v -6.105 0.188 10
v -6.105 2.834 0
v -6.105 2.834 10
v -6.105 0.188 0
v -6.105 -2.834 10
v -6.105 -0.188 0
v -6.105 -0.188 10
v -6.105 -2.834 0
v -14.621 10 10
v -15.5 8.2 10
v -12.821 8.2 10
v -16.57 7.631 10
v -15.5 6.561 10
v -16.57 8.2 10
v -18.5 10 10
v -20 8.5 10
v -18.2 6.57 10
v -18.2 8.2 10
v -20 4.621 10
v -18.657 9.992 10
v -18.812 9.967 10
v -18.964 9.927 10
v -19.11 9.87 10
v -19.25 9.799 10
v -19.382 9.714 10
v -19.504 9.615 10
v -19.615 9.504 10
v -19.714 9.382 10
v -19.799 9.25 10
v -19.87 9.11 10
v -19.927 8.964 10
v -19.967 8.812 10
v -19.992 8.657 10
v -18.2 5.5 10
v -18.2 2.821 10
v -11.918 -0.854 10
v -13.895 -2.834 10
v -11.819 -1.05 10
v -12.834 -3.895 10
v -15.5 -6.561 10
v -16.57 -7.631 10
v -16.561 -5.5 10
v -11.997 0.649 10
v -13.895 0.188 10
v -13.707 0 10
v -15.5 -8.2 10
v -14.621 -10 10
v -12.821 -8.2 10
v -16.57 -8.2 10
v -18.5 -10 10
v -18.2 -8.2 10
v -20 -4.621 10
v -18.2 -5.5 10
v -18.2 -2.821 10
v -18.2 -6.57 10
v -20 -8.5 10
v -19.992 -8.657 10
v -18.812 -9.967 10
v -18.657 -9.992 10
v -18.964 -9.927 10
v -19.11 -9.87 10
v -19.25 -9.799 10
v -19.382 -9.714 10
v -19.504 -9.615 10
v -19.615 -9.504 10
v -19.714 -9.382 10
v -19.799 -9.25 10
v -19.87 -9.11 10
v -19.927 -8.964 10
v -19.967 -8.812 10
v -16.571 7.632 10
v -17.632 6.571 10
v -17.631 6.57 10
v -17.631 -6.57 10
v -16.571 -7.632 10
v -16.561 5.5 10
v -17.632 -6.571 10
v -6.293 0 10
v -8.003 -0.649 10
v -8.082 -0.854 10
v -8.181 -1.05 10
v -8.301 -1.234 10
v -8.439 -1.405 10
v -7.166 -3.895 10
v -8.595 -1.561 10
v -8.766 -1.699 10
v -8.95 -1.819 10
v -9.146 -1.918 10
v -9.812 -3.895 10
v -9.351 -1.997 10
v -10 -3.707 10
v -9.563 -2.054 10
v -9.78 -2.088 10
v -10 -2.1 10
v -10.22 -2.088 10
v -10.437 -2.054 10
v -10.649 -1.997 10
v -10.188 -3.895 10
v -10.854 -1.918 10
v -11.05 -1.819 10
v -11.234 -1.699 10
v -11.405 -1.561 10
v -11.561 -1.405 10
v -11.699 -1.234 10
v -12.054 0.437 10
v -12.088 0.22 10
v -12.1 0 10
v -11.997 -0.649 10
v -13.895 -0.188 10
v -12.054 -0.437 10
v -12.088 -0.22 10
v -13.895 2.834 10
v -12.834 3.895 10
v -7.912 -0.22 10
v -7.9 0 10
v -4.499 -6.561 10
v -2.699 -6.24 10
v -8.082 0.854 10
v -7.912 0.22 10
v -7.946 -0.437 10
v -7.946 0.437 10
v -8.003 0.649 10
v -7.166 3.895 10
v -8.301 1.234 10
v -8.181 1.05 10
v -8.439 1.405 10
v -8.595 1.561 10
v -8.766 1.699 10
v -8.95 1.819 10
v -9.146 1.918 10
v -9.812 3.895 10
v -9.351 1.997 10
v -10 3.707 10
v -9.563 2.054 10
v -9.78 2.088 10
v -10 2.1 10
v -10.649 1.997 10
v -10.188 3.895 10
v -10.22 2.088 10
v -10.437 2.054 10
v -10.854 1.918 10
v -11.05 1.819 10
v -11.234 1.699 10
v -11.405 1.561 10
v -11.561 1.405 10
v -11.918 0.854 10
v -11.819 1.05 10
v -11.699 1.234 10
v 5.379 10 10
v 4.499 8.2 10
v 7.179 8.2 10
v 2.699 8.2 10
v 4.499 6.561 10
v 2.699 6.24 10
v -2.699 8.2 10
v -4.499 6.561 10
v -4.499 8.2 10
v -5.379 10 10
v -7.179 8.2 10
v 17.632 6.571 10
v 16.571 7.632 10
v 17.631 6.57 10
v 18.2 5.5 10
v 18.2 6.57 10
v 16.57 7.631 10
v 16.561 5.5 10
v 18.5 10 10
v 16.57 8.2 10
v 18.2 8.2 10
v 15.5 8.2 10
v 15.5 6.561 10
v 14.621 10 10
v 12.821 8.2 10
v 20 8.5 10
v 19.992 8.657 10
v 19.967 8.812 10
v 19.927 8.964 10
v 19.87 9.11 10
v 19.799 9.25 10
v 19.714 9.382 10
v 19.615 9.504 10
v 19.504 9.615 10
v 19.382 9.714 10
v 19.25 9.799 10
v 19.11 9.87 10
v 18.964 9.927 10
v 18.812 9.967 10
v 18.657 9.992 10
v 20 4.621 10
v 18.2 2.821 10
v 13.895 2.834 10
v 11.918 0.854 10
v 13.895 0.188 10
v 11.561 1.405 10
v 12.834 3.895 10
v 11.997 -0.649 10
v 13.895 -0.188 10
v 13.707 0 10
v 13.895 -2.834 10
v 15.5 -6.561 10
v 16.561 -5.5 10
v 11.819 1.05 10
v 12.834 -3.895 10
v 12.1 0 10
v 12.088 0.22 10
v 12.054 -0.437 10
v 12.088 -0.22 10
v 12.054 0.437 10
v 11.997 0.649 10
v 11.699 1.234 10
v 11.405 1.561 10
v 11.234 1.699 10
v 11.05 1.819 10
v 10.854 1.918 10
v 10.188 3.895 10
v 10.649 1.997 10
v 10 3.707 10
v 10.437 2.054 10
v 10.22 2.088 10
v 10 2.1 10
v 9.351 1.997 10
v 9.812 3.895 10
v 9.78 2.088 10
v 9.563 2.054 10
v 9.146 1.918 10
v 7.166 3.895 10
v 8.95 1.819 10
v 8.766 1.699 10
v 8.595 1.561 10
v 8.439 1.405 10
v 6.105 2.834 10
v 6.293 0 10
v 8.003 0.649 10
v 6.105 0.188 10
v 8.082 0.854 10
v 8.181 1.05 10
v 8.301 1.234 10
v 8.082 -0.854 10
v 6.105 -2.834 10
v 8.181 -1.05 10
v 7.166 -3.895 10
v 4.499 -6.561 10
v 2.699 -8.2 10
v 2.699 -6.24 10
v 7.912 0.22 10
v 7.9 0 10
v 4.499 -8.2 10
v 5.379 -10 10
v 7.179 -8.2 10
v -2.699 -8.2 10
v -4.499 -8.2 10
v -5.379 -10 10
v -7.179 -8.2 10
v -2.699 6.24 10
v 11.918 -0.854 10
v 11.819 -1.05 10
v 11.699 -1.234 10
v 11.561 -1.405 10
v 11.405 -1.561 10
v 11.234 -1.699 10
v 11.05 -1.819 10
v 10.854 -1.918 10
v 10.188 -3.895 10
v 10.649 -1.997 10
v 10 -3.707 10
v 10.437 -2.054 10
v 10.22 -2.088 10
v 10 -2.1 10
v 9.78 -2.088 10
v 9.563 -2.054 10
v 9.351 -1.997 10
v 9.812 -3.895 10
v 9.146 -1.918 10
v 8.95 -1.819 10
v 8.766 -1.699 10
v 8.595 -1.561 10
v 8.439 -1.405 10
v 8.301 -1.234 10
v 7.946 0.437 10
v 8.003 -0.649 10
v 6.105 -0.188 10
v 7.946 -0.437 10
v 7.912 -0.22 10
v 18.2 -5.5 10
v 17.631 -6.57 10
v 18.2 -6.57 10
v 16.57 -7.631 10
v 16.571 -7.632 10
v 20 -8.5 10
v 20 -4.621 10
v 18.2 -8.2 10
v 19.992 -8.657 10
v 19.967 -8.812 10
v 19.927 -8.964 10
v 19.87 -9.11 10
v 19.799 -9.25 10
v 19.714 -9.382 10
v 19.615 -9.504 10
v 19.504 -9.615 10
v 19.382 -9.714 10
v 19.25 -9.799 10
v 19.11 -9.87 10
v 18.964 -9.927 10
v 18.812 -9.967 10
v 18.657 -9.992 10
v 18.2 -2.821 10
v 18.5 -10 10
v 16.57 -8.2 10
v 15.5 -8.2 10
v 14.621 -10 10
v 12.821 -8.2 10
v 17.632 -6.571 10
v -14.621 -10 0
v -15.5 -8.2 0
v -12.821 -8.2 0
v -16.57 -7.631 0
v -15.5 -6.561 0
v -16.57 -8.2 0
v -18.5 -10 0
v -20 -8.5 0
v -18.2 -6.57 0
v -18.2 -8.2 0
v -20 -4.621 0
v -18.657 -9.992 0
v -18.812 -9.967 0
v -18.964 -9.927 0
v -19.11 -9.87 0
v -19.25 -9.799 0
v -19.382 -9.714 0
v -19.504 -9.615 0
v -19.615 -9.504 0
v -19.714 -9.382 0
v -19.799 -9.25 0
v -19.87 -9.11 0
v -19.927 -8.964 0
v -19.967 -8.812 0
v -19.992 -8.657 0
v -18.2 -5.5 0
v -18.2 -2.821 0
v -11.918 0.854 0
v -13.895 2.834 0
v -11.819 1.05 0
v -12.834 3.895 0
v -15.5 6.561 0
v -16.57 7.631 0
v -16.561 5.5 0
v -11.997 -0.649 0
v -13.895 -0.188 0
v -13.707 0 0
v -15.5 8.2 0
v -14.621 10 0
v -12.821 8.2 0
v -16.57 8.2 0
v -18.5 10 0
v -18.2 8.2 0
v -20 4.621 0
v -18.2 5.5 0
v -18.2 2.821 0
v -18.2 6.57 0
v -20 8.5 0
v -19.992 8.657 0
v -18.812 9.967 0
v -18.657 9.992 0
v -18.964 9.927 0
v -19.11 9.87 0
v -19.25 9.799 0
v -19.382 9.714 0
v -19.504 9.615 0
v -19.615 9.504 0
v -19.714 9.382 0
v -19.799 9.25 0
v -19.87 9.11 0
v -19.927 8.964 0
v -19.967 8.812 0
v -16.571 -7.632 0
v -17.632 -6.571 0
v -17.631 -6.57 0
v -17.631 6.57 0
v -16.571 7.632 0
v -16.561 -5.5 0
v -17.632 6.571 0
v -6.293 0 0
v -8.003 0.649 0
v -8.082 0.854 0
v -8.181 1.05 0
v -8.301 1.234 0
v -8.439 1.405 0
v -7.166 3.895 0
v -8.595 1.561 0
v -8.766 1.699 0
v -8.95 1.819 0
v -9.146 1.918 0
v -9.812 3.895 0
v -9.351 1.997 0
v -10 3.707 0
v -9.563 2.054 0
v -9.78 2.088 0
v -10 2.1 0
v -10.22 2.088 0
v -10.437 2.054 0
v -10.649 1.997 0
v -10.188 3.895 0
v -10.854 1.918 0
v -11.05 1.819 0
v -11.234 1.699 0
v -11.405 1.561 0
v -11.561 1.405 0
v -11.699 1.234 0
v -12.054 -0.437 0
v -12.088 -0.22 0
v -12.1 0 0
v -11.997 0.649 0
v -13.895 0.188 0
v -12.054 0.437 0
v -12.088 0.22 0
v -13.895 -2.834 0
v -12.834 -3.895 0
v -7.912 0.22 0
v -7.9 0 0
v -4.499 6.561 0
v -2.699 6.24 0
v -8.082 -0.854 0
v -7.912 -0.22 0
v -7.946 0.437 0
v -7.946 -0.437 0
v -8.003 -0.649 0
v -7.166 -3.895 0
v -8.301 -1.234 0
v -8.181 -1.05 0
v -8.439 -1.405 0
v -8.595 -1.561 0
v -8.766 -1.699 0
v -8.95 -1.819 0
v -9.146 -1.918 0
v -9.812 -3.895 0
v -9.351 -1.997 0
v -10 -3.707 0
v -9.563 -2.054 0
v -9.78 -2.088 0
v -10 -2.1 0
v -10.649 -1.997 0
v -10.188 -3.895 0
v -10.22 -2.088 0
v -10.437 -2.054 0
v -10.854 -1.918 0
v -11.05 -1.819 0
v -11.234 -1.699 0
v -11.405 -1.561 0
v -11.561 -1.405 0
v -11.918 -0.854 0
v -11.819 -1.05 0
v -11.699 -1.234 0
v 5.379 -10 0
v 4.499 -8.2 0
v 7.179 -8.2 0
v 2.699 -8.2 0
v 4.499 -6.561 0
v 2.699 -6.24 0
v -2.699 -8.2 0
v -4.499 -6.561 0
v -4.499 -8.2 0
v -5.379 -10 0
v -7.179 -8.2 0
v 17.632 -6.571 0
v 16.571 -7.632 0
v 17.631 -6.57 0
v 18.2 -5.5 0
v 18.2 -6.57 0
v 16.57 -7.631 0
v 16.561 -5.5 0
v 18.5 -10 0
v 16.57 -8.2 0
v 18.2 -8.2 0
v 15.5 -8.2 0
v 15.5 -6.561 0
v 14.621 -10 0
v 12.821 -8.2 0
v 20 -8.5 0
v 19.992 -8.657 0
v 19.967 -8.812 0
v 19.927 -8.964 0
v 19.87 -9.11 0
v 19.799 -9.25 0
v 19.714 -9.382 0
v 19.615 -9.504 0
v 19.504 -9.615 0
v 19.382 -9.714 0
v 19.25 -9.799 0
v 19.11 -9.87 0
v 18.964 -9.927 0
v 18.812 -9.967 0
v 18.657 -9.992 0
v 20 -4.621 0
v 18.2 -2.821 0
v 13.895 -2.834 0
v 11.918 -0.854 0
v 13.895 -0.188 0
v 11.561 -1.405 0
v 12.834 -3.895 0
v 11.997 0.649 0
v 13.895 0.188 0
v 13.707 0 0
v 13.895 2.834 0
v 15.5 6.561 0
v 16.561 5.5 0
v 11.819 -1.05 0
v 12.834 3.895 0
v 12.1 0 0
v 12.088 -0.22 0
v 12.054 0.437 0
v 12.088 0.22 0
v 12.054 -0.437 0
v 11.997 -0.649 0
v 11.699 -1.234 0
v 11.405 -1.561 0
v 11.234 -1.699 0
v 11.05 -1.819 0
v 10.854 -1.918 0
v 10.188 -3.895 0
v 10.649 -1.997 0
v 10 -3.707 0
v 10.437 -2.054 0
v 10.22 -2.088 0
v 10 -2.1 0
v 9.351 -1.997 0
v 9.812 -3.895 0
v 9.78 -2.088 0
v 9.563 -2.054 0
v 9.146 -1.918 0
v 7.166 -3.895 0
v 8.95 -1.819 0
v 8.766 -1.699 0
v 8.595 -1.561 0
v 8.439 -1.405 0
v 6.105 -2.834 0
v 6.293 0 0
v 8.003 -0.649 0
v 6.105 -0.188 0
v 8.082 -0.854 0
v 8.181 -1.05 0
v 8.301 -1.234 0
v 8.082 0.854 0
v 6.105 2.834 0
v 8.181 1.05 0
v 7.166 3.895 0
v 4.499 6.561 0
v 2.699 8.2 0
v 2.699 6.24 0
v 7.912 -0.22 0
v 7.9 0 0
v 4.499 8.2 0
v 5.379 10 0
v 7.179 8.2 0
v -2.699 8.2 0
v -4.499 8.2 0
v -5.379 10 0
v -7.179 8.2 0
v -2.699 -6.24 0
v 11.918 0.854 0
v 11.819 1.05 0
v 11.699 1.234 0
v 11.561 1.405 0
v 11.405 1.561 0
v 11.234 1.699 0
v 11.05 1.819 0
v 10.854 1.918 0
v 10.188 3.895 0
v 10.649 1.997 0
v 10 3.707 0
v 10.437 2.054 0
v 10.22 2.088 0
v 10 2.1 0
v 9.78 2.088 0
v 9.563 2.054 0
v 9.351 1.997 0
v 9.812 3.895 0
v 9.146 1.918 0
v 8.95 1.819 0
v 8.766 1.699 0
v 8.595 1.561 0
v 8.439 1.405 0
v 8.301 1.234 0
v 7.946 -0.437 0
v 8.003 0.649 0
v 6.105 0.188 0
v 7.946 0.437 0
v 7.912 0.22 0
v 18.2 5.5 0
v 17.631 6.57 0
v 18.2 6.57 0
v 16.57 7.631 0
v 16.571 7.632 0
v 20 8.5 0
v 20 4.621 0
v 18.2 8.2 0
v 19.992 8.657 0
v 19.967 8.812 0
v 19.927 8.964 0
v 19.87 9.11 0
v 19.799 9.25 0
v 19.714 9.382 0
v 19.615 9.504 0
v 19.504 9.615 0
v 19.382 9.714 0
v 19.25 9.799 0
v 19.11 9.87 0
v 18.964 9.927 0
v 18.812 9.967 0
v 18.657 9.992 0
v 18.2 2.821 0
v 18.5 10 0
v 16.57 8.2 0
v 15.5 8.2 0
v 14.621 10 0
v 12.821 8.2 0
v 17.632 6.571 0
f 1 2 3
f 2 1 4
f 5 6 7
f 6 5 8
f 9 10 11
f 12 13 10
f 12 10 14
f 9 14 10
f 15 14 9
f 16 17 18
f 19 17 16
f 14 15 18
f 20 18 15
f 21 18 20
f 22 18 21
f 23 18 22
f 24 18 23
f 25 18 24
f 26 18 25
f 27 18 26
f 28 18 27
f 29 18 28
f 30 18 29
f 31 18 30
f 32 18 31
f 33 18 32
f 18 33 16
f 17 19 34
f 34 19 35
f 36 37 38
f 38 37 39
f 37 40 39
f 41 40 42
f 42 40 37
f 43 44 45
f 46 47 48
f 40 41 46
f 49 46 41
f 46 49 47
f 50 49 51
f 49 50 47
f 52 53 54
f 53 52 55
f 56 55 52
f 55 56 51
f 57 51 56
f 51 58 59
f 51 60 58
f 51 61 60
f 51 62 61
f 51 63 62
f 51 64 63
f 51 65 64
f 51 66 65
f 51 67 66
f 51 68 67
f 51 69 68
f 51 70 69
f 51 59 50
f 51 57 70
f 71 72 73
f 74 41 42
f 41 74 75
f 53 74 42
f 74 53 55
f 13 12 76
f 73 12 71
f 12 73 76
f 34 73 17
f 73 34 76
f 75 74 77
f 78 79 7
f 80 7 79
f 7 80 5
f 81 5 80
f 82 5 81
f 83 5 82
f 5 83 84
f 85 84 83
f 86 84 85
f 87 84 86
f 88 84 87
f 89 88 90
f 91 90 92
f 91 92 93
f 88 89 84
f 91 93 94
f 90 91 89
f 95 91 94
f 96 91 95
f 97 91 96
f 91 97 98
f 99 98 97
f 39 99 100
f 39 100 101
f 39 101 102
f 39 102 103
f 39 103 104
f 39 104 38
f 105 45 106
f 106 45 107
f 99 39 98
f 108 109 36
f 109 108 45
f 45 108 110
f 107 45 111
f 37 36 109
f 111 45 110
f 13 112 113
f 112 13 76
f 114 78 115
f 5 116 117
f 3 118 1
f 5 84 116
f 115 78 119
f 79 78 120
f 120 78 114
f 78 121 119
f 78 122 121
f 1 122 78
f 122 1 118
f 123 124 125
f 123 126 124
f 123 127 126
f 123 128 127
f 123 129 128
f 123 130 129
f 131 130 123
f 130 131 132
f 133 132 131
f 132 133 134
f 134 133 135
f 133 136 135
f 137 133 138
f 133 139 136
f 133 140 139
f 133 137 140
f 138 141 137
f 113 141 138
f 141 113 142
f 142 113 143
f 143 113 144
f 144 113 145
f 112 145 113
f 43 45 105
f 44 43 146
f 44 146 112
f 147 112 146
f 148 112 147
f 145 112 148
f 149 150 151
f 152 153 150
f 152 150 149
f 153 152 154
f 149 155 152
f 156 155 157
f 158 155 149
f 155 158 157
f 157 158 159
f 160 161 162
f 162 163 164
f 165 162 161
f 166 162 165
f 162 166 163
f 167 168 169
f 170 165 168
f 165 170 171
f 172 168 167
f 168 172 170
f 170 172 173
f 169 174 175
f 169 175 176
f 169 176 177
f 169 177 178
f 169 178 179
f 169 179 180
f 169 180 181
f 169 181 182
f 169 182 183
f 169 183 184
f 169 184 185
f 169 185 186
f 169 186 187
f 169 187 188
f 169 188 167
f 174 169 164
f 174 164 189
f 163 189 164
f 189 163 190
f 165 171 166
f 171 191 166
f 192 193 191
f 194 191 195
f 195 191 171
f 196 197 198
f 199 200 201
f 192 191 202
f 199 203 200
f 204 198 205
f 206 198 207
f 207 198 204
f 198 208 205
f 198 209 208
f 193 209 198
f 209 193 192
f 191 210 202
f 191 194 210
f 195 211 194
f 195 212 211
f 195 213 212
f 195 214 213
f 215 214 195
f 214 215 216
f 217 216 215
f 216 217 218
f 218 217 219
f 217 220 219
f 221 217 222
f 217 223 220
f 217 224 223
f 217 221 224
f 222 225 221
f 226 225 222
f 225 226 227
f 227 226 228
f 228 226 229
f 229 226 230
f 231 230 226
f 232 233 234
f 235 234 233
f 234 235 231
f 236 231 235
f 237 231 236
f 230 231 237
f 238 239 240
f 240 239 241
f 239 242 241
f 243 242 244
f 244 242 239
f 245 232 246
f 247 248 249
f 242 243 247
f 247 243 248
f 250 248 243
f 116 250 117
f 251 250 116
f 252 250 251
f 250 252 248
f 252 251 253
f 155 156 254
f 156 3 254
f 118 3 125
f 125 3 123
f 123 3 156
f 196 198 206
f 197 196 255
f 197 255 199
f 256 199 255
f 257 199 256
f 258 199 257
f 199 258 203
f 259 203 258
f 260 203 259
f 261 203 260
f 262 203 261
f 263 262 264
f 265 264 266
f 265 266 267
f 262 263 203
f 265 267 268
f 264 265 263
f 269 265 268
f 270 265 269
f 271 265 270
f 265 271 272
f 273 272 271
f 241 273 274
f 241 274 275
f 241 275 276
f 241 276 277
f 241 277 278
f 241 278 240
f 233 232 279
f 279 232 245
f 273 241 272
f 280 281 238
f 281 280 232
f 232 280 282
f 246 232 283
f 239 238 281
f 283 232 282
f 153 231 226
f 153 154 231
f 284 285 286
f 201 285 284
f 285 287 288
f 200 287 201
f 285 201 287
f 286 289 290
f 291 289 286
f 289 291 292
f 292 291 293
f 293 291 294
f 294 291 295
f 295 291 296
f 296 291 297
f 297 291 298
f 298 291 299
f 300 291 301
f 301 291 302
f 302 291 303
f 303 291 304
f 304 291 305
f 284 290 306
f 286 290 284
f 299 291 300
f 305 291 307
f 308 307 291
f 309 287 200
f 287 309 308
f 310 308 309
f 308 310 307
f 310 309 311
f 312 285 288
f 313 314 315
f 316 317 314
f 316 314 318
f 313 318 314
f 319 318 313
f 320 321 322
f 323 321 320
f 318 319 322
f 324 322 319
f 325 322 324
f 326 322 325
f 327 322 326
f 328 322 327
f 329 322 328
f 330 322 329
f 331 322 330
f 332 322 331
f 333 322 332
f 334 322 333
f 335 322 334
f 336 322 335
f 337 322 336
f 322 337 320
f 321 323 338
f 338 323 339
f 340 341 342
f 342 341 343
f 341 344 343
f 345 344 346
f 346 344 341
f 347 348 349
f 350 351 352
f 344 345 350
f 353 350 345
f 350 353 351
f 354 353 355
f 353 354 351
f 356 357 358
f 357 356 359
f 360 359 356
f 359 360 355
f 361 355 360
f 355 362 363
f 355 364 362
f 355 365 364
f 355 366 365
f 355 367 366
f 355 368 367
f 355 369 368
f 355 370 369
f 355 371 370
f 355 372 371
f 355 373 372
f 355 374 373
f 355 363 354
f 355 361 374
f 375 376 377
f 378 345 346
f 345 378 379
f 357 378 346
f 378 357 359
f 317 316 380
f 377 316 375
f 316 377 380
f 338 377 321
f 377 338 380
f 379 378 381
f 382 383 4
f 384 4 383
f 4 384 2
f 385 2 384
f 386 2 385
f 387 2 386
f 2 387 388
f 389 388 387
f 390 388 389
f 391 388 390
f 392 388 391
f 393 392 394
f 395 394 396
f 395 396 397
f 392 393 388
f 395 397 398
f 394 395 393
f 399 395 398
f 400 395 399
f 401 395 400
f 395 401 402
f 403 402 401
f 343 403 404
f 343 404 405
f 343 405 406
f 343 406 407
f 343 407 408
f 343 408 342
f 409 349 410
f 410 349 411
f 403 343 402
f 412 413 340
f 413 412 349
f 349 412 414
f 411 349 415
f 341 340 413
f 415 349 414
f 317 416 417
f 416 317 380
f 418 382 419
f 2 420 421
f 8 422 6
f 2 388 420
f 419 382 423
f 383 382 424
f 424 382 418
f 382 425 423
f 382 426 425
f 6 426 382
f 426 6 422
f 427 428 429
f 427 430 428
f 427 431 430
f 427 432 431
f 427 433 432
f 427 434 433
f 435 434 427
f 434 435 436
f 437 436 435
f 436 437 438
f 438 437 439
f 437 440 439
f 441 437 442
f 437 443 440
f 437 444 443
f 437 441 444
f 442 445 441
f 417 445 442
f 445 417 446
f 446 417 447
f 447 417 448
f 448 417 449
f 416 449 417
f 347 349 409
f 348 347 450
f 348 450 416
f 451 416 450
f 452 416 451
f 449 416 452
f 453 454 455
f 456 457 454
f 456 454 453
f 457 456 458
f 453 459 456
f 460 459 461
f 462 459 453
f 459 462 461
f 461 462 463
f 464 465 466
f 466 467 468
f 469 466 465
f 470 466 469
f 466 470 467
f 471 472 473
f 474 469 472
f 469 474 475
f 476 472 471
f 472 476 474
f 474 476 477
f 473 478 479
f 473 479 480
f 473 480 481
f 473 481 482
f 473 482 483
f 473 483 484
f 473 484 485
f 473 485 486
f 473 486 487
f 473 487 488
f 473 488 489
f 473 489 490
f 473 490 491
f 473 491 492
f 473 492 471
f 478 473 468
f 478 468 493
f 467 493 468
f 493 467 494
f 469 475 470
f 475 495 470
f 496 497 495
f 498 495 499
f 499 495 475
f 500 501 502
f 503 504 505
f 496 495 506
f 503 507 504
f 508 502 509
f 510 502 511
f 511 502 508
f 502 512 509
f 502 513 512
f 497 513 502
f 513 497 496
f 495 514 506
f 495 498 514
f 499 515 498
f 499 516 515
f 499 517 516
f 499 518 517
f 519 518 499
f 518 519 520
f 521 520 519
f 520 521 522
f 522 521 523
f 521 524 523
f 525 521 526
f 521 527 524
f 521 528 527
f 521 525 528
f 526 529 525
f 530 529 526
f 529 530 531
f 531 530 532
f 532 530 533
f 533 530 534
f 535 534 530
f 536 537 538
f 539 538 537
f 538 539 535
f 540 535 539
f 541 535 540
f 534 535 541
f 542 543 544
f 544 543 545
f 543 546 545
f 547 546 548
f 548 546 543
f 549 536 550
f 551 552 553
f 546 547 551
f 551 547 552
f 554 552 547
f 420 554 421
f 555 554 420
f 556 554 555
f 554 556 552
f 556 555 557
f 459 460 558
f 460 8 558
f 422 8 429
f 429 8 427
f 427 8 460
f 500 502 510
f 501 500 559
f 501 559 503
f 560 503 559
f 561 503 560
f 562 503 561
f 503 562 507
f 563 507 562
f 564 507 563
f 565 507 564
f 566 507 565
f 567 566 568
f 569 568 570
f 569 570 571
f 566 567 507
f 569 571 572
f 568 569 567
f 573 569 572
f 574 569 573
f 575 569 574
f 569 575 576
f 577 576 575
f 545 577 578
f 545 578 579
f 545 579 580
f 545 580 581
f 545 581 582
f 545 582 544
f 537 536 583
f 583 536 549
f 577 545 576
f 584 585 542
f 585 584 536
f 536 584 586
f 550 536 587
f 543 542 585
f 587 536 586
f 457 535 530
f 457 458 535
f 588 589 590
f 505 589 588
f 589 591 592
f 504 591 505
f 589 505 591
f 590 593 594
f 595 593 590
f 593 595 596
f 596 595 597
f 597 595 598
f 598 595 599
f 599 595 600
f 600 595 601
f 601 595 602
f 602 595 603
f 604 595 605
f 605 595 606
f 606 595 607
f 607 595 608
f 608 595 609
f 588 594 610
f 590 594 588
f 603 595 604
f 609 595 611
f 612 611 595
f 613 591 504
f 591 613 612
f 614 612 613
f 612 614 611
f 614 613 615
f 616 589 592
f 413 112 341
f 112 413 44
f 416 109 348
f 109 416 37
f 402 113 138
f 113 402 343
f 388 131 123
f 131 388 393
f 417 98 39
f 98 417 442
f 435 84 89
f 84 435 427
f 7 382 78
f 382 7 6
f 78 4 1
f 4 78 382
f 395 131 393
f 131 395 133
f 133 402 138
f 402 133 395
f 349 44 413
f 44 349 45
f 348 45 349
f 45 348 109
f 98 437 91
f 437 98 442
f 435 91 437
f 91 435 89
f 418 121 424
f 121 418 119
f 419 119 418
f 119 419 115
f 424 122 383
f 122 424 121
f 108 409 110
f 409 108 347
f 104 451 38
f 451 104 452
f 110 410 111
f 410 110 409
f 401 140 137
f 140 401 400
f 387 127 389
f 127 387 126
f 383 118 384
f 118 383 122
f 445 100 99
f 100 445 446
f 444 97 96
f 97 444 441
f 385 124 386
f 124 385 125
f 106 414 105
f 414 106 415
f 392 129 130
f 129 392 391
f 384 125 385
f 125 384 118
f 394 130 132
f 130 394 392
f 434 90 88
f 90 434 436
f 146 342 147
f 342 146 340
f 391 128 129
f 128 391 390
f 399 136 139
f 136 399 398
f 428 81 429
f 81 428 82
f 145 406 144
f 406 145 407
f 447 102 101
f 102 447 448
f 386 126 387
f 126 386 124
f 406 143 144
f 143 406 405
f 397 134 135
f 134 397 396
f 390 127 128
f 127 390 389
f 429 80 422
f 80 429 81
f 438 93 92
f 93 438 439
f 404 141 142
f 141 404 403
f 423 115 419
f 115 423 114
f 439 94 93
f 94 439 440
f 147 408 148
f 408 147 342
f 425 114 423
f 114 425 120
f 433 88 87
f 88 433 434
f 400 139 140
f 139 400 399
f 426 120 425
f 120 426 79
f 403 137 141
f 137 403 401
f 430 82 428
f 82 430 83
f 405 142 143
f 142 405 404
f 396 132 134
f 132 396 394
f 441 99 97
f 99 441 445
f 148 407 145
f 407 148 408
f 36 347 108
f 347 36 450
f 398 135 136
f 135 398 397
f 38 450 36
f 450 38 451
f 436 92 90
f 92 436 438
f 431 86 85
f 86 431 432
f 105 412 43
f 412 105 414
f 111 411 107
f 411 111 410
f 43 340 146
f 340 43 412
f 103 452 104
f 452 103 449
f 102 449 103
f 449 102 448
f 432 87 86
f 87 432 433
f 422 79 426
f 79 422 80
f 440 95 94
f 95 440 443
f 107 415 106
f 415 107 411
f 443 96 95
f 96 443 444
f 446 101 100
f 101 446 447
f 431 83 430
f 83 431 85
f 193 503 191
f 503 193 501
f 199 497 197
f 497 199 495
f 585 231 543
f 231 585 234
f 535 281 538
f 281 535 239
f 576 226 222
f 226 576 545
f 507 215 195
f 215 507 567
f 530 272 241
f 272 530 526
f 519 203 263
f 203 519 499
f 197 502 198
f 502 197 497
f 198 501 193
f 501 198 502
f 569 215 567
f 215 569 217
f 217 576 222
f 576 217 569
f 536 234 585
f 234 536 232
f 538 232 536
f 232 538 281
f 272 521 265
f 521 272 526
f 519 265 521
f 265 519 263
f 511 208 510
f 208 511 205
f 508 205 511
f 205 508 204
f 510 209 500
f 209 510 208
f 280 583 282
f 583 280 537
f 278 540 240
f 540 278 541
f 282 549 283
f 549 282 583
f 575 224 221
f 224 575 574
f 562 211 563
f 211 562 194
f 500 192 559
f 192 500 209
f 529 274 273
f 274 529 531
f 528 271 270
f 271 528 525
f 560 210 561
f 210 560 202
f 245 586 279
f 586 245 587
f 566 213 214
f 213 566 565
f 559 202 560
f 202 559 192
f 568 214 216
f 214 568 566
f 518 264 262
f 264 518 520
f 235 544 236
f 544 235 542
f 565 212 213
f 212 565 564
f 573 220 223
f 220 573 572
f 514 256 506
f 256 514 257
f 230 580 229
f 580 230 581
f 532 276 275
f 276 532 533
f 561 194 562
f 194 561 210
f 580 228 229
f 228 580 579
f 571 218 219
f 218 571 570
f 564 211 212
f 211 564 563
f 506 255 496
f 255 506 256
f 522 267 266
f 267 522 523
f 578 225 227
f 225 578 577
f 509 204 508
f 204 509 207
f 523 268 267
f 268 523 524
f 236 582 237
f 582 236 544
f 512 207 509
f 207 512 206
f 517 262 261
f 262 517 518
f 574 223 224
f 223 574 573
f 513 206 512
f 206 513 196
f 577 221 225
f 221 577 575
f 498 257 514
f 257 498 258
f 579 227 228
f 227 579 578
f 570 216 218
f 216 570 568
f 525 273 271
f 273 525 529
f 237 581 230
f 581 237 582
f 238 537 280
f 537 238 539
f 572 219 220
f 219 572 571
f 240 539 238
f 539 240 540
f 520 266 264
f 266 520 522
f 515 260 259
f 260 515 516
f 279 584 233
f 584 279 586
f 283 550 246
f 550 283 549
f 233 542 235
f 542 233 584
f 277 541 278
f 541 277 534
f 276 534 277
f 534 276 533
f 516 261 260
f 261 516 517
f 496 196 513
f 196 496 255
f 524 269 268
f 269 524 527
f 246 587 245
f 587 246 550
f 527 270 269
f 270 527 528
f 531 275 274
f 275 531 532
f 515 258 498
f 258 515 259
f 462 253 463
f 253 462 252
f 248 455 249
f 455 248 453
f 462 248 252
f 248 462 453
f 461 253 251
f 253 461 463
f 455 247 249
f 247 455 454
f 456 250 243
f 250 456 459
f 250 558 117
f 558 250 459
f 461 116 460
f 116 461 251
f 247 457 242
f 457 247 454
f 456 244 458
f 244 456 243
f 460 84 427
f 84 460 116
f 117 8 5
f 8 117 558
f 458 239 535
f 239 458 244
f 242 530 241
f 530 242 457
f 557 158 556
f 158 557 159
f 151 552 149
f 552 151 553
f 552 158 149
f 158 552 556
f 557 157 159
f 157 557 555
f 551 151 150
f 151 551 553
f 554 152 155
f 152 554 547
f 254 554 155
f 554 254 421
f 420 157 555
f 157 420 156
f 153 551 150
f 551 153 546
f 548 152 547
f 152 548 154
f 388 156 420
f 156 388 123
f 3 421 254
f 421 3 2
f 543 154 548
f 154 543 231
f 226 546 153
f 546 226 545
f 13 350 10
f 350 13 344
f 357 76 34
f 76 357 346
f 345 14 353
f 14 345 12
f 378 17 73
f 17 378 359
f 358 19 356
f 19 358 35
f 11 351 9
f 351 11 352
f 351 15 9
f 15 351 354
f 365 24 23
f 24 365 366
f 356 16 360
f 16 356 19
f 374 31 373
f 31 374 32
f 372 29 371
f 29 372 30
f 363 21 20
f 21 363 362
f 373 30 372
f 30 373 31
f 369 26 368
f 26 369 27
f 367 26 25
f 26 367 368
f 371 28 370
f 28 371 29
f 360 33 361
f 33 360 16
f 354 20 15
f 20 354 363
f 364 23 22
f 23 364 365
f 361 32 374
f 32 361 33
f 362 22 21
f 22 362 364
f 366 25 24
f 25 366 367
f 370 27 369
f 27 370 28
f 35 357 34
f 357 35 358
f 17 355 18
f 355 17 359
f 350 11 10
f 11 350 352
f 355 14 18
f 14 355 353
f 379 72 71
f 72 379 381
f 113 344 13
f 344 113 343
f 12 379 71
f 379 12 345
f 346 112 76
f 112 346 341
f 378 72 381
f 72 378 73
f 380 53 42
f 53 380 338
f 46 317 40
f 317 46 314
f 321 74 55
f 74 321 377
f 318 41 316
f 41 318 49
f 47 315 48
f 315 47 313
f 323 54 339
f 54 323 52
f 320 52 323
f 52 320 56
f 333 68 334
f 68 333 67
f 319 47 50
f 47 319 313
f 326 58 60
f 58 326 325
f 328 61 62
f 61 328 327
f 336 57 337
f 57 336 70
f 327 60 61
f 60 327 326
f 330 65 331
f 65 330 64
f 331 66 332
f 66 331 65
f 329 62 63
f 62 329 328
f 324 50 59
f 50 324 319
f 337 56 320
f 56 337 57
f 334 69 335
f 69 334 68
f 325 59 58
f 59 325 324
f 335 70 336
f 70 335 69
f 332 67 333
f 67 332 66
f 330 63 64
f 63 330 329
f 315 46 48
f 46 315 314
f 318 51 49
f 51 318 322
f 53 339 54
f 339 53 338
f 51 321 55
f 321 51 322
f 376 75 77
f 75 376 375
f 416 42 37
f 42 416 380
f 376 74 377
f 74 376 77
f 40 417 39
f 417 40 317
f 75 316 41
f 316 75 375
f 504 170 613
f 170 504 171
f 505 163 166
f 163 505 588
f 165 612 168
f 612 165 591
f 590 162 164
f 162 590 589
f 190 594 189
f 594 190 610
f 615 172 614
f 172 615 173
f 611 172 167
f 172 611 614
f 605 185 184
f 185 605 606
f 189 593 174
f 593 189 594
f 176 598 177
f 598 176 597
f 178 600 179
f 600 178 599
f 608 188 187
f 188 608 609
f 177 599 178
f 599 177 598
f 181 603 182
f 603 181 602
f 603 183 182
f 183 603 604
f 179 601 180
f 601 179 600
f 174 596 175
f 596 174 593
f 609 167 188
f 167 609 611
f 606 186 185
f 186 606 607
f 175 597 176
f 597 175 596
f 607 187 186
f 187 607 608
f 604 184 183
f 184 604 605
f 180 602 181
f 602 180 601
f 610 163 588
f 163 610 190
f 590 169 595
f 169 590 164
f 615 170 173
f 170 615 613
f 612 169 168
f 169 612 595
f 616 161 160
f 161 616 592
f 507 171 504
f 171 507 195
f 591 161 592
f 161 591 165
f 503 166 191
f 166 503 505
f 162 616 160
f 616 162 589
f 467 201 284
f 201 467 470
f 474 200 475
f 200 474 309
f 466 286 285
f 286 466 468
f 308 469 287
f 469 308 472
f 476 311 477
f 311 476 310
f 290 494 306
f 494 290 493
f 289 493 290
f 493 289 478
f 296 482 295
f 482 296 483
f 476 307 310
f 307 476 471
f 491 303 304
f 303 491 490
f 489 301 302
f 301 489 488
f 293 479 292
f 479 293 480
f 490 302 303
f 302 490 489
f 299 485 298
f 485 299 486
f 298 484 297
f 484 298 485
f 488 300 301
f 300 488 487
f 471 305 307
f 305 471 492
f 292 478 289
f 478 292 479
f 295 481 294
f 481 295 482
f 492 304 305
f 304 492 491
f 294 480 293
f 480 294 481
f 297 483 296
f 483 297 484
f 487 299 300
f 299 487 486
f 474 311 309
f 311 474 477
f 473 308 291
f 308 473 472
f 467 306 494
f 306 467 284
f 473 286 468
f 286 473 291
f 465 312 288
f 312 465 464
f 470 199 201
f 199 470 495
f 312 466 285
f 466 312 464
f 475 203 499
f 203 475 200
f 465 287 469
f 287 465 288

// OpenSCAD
shape="20x40";//[20x20,20x40,20x60,20x80,40x40,C-Beam]
lenght=10;

//////////////
$fn=60;
module center() {
    difference() {
        
        intersection() {
            translate([0,0,0.5]) cube([7.79,7.79,1],center=true);
            cylinder(d=13.5,h=3,center=true,$fn=4);
        }
            
        
        cylinder(d=4.2,h=3,center=true);
        for(i=[0:90:270]) rotate([0,0,i]) translate([7.2425,0,0]) rotate([0,0,45]) cube(5,center=true);
    }
}




module corner() {
    difference() {
        translate([5.5,5.5,0]) cube([3,3,1]);
        translate([5.5+1.07,5.5+1.07,-0.5]) cube([3,3,2]);
    }
    translate([3,3,0])rotate([0,0,45]) translate([0,-0.75,0]) cube([5.8,1.5,1]);
    difference() {
        hull() {for(i=[0,1],j=[0,1]) translate([i*8.5,j*8.5,0]) cylinder(d=3,h=1);}
        for(i=[0,90]) rotate([0,0,i]) translate([12.45,0,0]) rotate([0,0,45]) cube(10,center=true);
        cube(16.4,center=true);
    }
}

module raccord() {
    translate([-10,0,0]) {
        difference() {
            translate([0,8.2,0]) cube([20,1.8,1]);
            for(i=[0,20]) translate([i,12.45,0]) rotate([0,0,45]) cube(10,center=true);
        }
        translate([10,0,0]) for(i=[-1,1]) scale([i,1,1]) translate([5.39868/2,10-1.8-1.96,0]) cube([1.8,2,1]);
         for(i=[0,1]) translate([i*20,0,0]) rotate([0,0,i*90]) translate([3,3,0])rotate([0,0,45]) translate([0,-0.75,0]) cube([5.33205,1.5,1]);
    }
}

module inner_corner() {
    difference() {
        union() {
            translate([10,0,0]) raccord();
            translate([0,10,0]) rotate([0,0,-90]) raccord();
        }
        translate([0,0,-0.5]) cube([11,8.2,3]);
        translate([0,0,-0.5]) cube([8.2,11,3]);
    }
    translate([3,3,0])rotate([0,0,45]) translate([0,-0.75,0]) cube([9,1.5,1]);  
}


module V_slot(shape,lenght) {
scale([1,1,lenght]) {
    if (shape=="20x20") {
            center();
            for(i=[0:90:270]) rotate([0,0,i]) corner();
        }
        
    else if (shape=="20x40") {
            for(i=[-1,1]) translate([i*10,0,0]) center();
            for(i=[-1,1]) scale([1,i,1]) raccord();
            for(j=[-1,1]) scale([j,1,1]) translate([10,0,0]) for(i=[0,-90]) rotate([0,0,i]) corner();
        }
        
    else if (shape=="20x60") {
            for(i=[-1,0,1]) translate([i*20,0,0]) center();
            for(i=[-1,1]) scale([1,i,1]) for(i=[-1,1]) translate([i*10,0,0]) raccord();
            for(j=[-1,1]) scale([j,1,1]) translate([20,0,0]) for(i=[0,-90]) rotate([0,0,i]) corner();
        }
        
    else if (shape=="20x80") {
            for(i=[-3,-1,1,3]) translate([i*10,0,0]) center();
            for(i=[-1,1]) scale([1,i,1]) for(i=[-1,0,1]) translate([i*20,0,0]) raccord();
            for(j=[-1,1]) scale([j,1,1]) translate([30,0,0]) for(i=[0,-90]) rotate([0,0,i]) corner();
        }
        
    else if (shape=="40x40") {
            for(i=[0:90:270]) rotate([0,0,i]) {
                translate([10,10,0]) center();
                translate([0,10,0]) raccord();
                translate([10,10,0]) corner();
            }
        }
        
    else {

        for(i=[-3,-1,1,3]) translate([i*10,-10,0]) center();
        for(i=[-3,,3]) translate([i*10,10,0]) center();
            
        scale([1,-1,1]) for(i=[-1,0,1]) translate([i*20,10,0]) raccord();
        for(i=[-90,90]) rotate([0,0,i]) translate([0,30,0]) raccord();
        translate([0,-10,0]) raccord();
            
        for(j=[-1,1]) scale([j,1,1]) translate([30,-10,0]) rotate([0,0,-90]) corner();
        for(j=[-1,1]) scale([j,1,1]) translate([30,10,0]) for(i=[0,90]) rotate([0,0,i]) corner();
        
        for(j=[-1,1]) scale([j,1,1]) translate([-30,-10,0]) inner_corner();
    
    }
}

}

V_slot(shape,lenght);
